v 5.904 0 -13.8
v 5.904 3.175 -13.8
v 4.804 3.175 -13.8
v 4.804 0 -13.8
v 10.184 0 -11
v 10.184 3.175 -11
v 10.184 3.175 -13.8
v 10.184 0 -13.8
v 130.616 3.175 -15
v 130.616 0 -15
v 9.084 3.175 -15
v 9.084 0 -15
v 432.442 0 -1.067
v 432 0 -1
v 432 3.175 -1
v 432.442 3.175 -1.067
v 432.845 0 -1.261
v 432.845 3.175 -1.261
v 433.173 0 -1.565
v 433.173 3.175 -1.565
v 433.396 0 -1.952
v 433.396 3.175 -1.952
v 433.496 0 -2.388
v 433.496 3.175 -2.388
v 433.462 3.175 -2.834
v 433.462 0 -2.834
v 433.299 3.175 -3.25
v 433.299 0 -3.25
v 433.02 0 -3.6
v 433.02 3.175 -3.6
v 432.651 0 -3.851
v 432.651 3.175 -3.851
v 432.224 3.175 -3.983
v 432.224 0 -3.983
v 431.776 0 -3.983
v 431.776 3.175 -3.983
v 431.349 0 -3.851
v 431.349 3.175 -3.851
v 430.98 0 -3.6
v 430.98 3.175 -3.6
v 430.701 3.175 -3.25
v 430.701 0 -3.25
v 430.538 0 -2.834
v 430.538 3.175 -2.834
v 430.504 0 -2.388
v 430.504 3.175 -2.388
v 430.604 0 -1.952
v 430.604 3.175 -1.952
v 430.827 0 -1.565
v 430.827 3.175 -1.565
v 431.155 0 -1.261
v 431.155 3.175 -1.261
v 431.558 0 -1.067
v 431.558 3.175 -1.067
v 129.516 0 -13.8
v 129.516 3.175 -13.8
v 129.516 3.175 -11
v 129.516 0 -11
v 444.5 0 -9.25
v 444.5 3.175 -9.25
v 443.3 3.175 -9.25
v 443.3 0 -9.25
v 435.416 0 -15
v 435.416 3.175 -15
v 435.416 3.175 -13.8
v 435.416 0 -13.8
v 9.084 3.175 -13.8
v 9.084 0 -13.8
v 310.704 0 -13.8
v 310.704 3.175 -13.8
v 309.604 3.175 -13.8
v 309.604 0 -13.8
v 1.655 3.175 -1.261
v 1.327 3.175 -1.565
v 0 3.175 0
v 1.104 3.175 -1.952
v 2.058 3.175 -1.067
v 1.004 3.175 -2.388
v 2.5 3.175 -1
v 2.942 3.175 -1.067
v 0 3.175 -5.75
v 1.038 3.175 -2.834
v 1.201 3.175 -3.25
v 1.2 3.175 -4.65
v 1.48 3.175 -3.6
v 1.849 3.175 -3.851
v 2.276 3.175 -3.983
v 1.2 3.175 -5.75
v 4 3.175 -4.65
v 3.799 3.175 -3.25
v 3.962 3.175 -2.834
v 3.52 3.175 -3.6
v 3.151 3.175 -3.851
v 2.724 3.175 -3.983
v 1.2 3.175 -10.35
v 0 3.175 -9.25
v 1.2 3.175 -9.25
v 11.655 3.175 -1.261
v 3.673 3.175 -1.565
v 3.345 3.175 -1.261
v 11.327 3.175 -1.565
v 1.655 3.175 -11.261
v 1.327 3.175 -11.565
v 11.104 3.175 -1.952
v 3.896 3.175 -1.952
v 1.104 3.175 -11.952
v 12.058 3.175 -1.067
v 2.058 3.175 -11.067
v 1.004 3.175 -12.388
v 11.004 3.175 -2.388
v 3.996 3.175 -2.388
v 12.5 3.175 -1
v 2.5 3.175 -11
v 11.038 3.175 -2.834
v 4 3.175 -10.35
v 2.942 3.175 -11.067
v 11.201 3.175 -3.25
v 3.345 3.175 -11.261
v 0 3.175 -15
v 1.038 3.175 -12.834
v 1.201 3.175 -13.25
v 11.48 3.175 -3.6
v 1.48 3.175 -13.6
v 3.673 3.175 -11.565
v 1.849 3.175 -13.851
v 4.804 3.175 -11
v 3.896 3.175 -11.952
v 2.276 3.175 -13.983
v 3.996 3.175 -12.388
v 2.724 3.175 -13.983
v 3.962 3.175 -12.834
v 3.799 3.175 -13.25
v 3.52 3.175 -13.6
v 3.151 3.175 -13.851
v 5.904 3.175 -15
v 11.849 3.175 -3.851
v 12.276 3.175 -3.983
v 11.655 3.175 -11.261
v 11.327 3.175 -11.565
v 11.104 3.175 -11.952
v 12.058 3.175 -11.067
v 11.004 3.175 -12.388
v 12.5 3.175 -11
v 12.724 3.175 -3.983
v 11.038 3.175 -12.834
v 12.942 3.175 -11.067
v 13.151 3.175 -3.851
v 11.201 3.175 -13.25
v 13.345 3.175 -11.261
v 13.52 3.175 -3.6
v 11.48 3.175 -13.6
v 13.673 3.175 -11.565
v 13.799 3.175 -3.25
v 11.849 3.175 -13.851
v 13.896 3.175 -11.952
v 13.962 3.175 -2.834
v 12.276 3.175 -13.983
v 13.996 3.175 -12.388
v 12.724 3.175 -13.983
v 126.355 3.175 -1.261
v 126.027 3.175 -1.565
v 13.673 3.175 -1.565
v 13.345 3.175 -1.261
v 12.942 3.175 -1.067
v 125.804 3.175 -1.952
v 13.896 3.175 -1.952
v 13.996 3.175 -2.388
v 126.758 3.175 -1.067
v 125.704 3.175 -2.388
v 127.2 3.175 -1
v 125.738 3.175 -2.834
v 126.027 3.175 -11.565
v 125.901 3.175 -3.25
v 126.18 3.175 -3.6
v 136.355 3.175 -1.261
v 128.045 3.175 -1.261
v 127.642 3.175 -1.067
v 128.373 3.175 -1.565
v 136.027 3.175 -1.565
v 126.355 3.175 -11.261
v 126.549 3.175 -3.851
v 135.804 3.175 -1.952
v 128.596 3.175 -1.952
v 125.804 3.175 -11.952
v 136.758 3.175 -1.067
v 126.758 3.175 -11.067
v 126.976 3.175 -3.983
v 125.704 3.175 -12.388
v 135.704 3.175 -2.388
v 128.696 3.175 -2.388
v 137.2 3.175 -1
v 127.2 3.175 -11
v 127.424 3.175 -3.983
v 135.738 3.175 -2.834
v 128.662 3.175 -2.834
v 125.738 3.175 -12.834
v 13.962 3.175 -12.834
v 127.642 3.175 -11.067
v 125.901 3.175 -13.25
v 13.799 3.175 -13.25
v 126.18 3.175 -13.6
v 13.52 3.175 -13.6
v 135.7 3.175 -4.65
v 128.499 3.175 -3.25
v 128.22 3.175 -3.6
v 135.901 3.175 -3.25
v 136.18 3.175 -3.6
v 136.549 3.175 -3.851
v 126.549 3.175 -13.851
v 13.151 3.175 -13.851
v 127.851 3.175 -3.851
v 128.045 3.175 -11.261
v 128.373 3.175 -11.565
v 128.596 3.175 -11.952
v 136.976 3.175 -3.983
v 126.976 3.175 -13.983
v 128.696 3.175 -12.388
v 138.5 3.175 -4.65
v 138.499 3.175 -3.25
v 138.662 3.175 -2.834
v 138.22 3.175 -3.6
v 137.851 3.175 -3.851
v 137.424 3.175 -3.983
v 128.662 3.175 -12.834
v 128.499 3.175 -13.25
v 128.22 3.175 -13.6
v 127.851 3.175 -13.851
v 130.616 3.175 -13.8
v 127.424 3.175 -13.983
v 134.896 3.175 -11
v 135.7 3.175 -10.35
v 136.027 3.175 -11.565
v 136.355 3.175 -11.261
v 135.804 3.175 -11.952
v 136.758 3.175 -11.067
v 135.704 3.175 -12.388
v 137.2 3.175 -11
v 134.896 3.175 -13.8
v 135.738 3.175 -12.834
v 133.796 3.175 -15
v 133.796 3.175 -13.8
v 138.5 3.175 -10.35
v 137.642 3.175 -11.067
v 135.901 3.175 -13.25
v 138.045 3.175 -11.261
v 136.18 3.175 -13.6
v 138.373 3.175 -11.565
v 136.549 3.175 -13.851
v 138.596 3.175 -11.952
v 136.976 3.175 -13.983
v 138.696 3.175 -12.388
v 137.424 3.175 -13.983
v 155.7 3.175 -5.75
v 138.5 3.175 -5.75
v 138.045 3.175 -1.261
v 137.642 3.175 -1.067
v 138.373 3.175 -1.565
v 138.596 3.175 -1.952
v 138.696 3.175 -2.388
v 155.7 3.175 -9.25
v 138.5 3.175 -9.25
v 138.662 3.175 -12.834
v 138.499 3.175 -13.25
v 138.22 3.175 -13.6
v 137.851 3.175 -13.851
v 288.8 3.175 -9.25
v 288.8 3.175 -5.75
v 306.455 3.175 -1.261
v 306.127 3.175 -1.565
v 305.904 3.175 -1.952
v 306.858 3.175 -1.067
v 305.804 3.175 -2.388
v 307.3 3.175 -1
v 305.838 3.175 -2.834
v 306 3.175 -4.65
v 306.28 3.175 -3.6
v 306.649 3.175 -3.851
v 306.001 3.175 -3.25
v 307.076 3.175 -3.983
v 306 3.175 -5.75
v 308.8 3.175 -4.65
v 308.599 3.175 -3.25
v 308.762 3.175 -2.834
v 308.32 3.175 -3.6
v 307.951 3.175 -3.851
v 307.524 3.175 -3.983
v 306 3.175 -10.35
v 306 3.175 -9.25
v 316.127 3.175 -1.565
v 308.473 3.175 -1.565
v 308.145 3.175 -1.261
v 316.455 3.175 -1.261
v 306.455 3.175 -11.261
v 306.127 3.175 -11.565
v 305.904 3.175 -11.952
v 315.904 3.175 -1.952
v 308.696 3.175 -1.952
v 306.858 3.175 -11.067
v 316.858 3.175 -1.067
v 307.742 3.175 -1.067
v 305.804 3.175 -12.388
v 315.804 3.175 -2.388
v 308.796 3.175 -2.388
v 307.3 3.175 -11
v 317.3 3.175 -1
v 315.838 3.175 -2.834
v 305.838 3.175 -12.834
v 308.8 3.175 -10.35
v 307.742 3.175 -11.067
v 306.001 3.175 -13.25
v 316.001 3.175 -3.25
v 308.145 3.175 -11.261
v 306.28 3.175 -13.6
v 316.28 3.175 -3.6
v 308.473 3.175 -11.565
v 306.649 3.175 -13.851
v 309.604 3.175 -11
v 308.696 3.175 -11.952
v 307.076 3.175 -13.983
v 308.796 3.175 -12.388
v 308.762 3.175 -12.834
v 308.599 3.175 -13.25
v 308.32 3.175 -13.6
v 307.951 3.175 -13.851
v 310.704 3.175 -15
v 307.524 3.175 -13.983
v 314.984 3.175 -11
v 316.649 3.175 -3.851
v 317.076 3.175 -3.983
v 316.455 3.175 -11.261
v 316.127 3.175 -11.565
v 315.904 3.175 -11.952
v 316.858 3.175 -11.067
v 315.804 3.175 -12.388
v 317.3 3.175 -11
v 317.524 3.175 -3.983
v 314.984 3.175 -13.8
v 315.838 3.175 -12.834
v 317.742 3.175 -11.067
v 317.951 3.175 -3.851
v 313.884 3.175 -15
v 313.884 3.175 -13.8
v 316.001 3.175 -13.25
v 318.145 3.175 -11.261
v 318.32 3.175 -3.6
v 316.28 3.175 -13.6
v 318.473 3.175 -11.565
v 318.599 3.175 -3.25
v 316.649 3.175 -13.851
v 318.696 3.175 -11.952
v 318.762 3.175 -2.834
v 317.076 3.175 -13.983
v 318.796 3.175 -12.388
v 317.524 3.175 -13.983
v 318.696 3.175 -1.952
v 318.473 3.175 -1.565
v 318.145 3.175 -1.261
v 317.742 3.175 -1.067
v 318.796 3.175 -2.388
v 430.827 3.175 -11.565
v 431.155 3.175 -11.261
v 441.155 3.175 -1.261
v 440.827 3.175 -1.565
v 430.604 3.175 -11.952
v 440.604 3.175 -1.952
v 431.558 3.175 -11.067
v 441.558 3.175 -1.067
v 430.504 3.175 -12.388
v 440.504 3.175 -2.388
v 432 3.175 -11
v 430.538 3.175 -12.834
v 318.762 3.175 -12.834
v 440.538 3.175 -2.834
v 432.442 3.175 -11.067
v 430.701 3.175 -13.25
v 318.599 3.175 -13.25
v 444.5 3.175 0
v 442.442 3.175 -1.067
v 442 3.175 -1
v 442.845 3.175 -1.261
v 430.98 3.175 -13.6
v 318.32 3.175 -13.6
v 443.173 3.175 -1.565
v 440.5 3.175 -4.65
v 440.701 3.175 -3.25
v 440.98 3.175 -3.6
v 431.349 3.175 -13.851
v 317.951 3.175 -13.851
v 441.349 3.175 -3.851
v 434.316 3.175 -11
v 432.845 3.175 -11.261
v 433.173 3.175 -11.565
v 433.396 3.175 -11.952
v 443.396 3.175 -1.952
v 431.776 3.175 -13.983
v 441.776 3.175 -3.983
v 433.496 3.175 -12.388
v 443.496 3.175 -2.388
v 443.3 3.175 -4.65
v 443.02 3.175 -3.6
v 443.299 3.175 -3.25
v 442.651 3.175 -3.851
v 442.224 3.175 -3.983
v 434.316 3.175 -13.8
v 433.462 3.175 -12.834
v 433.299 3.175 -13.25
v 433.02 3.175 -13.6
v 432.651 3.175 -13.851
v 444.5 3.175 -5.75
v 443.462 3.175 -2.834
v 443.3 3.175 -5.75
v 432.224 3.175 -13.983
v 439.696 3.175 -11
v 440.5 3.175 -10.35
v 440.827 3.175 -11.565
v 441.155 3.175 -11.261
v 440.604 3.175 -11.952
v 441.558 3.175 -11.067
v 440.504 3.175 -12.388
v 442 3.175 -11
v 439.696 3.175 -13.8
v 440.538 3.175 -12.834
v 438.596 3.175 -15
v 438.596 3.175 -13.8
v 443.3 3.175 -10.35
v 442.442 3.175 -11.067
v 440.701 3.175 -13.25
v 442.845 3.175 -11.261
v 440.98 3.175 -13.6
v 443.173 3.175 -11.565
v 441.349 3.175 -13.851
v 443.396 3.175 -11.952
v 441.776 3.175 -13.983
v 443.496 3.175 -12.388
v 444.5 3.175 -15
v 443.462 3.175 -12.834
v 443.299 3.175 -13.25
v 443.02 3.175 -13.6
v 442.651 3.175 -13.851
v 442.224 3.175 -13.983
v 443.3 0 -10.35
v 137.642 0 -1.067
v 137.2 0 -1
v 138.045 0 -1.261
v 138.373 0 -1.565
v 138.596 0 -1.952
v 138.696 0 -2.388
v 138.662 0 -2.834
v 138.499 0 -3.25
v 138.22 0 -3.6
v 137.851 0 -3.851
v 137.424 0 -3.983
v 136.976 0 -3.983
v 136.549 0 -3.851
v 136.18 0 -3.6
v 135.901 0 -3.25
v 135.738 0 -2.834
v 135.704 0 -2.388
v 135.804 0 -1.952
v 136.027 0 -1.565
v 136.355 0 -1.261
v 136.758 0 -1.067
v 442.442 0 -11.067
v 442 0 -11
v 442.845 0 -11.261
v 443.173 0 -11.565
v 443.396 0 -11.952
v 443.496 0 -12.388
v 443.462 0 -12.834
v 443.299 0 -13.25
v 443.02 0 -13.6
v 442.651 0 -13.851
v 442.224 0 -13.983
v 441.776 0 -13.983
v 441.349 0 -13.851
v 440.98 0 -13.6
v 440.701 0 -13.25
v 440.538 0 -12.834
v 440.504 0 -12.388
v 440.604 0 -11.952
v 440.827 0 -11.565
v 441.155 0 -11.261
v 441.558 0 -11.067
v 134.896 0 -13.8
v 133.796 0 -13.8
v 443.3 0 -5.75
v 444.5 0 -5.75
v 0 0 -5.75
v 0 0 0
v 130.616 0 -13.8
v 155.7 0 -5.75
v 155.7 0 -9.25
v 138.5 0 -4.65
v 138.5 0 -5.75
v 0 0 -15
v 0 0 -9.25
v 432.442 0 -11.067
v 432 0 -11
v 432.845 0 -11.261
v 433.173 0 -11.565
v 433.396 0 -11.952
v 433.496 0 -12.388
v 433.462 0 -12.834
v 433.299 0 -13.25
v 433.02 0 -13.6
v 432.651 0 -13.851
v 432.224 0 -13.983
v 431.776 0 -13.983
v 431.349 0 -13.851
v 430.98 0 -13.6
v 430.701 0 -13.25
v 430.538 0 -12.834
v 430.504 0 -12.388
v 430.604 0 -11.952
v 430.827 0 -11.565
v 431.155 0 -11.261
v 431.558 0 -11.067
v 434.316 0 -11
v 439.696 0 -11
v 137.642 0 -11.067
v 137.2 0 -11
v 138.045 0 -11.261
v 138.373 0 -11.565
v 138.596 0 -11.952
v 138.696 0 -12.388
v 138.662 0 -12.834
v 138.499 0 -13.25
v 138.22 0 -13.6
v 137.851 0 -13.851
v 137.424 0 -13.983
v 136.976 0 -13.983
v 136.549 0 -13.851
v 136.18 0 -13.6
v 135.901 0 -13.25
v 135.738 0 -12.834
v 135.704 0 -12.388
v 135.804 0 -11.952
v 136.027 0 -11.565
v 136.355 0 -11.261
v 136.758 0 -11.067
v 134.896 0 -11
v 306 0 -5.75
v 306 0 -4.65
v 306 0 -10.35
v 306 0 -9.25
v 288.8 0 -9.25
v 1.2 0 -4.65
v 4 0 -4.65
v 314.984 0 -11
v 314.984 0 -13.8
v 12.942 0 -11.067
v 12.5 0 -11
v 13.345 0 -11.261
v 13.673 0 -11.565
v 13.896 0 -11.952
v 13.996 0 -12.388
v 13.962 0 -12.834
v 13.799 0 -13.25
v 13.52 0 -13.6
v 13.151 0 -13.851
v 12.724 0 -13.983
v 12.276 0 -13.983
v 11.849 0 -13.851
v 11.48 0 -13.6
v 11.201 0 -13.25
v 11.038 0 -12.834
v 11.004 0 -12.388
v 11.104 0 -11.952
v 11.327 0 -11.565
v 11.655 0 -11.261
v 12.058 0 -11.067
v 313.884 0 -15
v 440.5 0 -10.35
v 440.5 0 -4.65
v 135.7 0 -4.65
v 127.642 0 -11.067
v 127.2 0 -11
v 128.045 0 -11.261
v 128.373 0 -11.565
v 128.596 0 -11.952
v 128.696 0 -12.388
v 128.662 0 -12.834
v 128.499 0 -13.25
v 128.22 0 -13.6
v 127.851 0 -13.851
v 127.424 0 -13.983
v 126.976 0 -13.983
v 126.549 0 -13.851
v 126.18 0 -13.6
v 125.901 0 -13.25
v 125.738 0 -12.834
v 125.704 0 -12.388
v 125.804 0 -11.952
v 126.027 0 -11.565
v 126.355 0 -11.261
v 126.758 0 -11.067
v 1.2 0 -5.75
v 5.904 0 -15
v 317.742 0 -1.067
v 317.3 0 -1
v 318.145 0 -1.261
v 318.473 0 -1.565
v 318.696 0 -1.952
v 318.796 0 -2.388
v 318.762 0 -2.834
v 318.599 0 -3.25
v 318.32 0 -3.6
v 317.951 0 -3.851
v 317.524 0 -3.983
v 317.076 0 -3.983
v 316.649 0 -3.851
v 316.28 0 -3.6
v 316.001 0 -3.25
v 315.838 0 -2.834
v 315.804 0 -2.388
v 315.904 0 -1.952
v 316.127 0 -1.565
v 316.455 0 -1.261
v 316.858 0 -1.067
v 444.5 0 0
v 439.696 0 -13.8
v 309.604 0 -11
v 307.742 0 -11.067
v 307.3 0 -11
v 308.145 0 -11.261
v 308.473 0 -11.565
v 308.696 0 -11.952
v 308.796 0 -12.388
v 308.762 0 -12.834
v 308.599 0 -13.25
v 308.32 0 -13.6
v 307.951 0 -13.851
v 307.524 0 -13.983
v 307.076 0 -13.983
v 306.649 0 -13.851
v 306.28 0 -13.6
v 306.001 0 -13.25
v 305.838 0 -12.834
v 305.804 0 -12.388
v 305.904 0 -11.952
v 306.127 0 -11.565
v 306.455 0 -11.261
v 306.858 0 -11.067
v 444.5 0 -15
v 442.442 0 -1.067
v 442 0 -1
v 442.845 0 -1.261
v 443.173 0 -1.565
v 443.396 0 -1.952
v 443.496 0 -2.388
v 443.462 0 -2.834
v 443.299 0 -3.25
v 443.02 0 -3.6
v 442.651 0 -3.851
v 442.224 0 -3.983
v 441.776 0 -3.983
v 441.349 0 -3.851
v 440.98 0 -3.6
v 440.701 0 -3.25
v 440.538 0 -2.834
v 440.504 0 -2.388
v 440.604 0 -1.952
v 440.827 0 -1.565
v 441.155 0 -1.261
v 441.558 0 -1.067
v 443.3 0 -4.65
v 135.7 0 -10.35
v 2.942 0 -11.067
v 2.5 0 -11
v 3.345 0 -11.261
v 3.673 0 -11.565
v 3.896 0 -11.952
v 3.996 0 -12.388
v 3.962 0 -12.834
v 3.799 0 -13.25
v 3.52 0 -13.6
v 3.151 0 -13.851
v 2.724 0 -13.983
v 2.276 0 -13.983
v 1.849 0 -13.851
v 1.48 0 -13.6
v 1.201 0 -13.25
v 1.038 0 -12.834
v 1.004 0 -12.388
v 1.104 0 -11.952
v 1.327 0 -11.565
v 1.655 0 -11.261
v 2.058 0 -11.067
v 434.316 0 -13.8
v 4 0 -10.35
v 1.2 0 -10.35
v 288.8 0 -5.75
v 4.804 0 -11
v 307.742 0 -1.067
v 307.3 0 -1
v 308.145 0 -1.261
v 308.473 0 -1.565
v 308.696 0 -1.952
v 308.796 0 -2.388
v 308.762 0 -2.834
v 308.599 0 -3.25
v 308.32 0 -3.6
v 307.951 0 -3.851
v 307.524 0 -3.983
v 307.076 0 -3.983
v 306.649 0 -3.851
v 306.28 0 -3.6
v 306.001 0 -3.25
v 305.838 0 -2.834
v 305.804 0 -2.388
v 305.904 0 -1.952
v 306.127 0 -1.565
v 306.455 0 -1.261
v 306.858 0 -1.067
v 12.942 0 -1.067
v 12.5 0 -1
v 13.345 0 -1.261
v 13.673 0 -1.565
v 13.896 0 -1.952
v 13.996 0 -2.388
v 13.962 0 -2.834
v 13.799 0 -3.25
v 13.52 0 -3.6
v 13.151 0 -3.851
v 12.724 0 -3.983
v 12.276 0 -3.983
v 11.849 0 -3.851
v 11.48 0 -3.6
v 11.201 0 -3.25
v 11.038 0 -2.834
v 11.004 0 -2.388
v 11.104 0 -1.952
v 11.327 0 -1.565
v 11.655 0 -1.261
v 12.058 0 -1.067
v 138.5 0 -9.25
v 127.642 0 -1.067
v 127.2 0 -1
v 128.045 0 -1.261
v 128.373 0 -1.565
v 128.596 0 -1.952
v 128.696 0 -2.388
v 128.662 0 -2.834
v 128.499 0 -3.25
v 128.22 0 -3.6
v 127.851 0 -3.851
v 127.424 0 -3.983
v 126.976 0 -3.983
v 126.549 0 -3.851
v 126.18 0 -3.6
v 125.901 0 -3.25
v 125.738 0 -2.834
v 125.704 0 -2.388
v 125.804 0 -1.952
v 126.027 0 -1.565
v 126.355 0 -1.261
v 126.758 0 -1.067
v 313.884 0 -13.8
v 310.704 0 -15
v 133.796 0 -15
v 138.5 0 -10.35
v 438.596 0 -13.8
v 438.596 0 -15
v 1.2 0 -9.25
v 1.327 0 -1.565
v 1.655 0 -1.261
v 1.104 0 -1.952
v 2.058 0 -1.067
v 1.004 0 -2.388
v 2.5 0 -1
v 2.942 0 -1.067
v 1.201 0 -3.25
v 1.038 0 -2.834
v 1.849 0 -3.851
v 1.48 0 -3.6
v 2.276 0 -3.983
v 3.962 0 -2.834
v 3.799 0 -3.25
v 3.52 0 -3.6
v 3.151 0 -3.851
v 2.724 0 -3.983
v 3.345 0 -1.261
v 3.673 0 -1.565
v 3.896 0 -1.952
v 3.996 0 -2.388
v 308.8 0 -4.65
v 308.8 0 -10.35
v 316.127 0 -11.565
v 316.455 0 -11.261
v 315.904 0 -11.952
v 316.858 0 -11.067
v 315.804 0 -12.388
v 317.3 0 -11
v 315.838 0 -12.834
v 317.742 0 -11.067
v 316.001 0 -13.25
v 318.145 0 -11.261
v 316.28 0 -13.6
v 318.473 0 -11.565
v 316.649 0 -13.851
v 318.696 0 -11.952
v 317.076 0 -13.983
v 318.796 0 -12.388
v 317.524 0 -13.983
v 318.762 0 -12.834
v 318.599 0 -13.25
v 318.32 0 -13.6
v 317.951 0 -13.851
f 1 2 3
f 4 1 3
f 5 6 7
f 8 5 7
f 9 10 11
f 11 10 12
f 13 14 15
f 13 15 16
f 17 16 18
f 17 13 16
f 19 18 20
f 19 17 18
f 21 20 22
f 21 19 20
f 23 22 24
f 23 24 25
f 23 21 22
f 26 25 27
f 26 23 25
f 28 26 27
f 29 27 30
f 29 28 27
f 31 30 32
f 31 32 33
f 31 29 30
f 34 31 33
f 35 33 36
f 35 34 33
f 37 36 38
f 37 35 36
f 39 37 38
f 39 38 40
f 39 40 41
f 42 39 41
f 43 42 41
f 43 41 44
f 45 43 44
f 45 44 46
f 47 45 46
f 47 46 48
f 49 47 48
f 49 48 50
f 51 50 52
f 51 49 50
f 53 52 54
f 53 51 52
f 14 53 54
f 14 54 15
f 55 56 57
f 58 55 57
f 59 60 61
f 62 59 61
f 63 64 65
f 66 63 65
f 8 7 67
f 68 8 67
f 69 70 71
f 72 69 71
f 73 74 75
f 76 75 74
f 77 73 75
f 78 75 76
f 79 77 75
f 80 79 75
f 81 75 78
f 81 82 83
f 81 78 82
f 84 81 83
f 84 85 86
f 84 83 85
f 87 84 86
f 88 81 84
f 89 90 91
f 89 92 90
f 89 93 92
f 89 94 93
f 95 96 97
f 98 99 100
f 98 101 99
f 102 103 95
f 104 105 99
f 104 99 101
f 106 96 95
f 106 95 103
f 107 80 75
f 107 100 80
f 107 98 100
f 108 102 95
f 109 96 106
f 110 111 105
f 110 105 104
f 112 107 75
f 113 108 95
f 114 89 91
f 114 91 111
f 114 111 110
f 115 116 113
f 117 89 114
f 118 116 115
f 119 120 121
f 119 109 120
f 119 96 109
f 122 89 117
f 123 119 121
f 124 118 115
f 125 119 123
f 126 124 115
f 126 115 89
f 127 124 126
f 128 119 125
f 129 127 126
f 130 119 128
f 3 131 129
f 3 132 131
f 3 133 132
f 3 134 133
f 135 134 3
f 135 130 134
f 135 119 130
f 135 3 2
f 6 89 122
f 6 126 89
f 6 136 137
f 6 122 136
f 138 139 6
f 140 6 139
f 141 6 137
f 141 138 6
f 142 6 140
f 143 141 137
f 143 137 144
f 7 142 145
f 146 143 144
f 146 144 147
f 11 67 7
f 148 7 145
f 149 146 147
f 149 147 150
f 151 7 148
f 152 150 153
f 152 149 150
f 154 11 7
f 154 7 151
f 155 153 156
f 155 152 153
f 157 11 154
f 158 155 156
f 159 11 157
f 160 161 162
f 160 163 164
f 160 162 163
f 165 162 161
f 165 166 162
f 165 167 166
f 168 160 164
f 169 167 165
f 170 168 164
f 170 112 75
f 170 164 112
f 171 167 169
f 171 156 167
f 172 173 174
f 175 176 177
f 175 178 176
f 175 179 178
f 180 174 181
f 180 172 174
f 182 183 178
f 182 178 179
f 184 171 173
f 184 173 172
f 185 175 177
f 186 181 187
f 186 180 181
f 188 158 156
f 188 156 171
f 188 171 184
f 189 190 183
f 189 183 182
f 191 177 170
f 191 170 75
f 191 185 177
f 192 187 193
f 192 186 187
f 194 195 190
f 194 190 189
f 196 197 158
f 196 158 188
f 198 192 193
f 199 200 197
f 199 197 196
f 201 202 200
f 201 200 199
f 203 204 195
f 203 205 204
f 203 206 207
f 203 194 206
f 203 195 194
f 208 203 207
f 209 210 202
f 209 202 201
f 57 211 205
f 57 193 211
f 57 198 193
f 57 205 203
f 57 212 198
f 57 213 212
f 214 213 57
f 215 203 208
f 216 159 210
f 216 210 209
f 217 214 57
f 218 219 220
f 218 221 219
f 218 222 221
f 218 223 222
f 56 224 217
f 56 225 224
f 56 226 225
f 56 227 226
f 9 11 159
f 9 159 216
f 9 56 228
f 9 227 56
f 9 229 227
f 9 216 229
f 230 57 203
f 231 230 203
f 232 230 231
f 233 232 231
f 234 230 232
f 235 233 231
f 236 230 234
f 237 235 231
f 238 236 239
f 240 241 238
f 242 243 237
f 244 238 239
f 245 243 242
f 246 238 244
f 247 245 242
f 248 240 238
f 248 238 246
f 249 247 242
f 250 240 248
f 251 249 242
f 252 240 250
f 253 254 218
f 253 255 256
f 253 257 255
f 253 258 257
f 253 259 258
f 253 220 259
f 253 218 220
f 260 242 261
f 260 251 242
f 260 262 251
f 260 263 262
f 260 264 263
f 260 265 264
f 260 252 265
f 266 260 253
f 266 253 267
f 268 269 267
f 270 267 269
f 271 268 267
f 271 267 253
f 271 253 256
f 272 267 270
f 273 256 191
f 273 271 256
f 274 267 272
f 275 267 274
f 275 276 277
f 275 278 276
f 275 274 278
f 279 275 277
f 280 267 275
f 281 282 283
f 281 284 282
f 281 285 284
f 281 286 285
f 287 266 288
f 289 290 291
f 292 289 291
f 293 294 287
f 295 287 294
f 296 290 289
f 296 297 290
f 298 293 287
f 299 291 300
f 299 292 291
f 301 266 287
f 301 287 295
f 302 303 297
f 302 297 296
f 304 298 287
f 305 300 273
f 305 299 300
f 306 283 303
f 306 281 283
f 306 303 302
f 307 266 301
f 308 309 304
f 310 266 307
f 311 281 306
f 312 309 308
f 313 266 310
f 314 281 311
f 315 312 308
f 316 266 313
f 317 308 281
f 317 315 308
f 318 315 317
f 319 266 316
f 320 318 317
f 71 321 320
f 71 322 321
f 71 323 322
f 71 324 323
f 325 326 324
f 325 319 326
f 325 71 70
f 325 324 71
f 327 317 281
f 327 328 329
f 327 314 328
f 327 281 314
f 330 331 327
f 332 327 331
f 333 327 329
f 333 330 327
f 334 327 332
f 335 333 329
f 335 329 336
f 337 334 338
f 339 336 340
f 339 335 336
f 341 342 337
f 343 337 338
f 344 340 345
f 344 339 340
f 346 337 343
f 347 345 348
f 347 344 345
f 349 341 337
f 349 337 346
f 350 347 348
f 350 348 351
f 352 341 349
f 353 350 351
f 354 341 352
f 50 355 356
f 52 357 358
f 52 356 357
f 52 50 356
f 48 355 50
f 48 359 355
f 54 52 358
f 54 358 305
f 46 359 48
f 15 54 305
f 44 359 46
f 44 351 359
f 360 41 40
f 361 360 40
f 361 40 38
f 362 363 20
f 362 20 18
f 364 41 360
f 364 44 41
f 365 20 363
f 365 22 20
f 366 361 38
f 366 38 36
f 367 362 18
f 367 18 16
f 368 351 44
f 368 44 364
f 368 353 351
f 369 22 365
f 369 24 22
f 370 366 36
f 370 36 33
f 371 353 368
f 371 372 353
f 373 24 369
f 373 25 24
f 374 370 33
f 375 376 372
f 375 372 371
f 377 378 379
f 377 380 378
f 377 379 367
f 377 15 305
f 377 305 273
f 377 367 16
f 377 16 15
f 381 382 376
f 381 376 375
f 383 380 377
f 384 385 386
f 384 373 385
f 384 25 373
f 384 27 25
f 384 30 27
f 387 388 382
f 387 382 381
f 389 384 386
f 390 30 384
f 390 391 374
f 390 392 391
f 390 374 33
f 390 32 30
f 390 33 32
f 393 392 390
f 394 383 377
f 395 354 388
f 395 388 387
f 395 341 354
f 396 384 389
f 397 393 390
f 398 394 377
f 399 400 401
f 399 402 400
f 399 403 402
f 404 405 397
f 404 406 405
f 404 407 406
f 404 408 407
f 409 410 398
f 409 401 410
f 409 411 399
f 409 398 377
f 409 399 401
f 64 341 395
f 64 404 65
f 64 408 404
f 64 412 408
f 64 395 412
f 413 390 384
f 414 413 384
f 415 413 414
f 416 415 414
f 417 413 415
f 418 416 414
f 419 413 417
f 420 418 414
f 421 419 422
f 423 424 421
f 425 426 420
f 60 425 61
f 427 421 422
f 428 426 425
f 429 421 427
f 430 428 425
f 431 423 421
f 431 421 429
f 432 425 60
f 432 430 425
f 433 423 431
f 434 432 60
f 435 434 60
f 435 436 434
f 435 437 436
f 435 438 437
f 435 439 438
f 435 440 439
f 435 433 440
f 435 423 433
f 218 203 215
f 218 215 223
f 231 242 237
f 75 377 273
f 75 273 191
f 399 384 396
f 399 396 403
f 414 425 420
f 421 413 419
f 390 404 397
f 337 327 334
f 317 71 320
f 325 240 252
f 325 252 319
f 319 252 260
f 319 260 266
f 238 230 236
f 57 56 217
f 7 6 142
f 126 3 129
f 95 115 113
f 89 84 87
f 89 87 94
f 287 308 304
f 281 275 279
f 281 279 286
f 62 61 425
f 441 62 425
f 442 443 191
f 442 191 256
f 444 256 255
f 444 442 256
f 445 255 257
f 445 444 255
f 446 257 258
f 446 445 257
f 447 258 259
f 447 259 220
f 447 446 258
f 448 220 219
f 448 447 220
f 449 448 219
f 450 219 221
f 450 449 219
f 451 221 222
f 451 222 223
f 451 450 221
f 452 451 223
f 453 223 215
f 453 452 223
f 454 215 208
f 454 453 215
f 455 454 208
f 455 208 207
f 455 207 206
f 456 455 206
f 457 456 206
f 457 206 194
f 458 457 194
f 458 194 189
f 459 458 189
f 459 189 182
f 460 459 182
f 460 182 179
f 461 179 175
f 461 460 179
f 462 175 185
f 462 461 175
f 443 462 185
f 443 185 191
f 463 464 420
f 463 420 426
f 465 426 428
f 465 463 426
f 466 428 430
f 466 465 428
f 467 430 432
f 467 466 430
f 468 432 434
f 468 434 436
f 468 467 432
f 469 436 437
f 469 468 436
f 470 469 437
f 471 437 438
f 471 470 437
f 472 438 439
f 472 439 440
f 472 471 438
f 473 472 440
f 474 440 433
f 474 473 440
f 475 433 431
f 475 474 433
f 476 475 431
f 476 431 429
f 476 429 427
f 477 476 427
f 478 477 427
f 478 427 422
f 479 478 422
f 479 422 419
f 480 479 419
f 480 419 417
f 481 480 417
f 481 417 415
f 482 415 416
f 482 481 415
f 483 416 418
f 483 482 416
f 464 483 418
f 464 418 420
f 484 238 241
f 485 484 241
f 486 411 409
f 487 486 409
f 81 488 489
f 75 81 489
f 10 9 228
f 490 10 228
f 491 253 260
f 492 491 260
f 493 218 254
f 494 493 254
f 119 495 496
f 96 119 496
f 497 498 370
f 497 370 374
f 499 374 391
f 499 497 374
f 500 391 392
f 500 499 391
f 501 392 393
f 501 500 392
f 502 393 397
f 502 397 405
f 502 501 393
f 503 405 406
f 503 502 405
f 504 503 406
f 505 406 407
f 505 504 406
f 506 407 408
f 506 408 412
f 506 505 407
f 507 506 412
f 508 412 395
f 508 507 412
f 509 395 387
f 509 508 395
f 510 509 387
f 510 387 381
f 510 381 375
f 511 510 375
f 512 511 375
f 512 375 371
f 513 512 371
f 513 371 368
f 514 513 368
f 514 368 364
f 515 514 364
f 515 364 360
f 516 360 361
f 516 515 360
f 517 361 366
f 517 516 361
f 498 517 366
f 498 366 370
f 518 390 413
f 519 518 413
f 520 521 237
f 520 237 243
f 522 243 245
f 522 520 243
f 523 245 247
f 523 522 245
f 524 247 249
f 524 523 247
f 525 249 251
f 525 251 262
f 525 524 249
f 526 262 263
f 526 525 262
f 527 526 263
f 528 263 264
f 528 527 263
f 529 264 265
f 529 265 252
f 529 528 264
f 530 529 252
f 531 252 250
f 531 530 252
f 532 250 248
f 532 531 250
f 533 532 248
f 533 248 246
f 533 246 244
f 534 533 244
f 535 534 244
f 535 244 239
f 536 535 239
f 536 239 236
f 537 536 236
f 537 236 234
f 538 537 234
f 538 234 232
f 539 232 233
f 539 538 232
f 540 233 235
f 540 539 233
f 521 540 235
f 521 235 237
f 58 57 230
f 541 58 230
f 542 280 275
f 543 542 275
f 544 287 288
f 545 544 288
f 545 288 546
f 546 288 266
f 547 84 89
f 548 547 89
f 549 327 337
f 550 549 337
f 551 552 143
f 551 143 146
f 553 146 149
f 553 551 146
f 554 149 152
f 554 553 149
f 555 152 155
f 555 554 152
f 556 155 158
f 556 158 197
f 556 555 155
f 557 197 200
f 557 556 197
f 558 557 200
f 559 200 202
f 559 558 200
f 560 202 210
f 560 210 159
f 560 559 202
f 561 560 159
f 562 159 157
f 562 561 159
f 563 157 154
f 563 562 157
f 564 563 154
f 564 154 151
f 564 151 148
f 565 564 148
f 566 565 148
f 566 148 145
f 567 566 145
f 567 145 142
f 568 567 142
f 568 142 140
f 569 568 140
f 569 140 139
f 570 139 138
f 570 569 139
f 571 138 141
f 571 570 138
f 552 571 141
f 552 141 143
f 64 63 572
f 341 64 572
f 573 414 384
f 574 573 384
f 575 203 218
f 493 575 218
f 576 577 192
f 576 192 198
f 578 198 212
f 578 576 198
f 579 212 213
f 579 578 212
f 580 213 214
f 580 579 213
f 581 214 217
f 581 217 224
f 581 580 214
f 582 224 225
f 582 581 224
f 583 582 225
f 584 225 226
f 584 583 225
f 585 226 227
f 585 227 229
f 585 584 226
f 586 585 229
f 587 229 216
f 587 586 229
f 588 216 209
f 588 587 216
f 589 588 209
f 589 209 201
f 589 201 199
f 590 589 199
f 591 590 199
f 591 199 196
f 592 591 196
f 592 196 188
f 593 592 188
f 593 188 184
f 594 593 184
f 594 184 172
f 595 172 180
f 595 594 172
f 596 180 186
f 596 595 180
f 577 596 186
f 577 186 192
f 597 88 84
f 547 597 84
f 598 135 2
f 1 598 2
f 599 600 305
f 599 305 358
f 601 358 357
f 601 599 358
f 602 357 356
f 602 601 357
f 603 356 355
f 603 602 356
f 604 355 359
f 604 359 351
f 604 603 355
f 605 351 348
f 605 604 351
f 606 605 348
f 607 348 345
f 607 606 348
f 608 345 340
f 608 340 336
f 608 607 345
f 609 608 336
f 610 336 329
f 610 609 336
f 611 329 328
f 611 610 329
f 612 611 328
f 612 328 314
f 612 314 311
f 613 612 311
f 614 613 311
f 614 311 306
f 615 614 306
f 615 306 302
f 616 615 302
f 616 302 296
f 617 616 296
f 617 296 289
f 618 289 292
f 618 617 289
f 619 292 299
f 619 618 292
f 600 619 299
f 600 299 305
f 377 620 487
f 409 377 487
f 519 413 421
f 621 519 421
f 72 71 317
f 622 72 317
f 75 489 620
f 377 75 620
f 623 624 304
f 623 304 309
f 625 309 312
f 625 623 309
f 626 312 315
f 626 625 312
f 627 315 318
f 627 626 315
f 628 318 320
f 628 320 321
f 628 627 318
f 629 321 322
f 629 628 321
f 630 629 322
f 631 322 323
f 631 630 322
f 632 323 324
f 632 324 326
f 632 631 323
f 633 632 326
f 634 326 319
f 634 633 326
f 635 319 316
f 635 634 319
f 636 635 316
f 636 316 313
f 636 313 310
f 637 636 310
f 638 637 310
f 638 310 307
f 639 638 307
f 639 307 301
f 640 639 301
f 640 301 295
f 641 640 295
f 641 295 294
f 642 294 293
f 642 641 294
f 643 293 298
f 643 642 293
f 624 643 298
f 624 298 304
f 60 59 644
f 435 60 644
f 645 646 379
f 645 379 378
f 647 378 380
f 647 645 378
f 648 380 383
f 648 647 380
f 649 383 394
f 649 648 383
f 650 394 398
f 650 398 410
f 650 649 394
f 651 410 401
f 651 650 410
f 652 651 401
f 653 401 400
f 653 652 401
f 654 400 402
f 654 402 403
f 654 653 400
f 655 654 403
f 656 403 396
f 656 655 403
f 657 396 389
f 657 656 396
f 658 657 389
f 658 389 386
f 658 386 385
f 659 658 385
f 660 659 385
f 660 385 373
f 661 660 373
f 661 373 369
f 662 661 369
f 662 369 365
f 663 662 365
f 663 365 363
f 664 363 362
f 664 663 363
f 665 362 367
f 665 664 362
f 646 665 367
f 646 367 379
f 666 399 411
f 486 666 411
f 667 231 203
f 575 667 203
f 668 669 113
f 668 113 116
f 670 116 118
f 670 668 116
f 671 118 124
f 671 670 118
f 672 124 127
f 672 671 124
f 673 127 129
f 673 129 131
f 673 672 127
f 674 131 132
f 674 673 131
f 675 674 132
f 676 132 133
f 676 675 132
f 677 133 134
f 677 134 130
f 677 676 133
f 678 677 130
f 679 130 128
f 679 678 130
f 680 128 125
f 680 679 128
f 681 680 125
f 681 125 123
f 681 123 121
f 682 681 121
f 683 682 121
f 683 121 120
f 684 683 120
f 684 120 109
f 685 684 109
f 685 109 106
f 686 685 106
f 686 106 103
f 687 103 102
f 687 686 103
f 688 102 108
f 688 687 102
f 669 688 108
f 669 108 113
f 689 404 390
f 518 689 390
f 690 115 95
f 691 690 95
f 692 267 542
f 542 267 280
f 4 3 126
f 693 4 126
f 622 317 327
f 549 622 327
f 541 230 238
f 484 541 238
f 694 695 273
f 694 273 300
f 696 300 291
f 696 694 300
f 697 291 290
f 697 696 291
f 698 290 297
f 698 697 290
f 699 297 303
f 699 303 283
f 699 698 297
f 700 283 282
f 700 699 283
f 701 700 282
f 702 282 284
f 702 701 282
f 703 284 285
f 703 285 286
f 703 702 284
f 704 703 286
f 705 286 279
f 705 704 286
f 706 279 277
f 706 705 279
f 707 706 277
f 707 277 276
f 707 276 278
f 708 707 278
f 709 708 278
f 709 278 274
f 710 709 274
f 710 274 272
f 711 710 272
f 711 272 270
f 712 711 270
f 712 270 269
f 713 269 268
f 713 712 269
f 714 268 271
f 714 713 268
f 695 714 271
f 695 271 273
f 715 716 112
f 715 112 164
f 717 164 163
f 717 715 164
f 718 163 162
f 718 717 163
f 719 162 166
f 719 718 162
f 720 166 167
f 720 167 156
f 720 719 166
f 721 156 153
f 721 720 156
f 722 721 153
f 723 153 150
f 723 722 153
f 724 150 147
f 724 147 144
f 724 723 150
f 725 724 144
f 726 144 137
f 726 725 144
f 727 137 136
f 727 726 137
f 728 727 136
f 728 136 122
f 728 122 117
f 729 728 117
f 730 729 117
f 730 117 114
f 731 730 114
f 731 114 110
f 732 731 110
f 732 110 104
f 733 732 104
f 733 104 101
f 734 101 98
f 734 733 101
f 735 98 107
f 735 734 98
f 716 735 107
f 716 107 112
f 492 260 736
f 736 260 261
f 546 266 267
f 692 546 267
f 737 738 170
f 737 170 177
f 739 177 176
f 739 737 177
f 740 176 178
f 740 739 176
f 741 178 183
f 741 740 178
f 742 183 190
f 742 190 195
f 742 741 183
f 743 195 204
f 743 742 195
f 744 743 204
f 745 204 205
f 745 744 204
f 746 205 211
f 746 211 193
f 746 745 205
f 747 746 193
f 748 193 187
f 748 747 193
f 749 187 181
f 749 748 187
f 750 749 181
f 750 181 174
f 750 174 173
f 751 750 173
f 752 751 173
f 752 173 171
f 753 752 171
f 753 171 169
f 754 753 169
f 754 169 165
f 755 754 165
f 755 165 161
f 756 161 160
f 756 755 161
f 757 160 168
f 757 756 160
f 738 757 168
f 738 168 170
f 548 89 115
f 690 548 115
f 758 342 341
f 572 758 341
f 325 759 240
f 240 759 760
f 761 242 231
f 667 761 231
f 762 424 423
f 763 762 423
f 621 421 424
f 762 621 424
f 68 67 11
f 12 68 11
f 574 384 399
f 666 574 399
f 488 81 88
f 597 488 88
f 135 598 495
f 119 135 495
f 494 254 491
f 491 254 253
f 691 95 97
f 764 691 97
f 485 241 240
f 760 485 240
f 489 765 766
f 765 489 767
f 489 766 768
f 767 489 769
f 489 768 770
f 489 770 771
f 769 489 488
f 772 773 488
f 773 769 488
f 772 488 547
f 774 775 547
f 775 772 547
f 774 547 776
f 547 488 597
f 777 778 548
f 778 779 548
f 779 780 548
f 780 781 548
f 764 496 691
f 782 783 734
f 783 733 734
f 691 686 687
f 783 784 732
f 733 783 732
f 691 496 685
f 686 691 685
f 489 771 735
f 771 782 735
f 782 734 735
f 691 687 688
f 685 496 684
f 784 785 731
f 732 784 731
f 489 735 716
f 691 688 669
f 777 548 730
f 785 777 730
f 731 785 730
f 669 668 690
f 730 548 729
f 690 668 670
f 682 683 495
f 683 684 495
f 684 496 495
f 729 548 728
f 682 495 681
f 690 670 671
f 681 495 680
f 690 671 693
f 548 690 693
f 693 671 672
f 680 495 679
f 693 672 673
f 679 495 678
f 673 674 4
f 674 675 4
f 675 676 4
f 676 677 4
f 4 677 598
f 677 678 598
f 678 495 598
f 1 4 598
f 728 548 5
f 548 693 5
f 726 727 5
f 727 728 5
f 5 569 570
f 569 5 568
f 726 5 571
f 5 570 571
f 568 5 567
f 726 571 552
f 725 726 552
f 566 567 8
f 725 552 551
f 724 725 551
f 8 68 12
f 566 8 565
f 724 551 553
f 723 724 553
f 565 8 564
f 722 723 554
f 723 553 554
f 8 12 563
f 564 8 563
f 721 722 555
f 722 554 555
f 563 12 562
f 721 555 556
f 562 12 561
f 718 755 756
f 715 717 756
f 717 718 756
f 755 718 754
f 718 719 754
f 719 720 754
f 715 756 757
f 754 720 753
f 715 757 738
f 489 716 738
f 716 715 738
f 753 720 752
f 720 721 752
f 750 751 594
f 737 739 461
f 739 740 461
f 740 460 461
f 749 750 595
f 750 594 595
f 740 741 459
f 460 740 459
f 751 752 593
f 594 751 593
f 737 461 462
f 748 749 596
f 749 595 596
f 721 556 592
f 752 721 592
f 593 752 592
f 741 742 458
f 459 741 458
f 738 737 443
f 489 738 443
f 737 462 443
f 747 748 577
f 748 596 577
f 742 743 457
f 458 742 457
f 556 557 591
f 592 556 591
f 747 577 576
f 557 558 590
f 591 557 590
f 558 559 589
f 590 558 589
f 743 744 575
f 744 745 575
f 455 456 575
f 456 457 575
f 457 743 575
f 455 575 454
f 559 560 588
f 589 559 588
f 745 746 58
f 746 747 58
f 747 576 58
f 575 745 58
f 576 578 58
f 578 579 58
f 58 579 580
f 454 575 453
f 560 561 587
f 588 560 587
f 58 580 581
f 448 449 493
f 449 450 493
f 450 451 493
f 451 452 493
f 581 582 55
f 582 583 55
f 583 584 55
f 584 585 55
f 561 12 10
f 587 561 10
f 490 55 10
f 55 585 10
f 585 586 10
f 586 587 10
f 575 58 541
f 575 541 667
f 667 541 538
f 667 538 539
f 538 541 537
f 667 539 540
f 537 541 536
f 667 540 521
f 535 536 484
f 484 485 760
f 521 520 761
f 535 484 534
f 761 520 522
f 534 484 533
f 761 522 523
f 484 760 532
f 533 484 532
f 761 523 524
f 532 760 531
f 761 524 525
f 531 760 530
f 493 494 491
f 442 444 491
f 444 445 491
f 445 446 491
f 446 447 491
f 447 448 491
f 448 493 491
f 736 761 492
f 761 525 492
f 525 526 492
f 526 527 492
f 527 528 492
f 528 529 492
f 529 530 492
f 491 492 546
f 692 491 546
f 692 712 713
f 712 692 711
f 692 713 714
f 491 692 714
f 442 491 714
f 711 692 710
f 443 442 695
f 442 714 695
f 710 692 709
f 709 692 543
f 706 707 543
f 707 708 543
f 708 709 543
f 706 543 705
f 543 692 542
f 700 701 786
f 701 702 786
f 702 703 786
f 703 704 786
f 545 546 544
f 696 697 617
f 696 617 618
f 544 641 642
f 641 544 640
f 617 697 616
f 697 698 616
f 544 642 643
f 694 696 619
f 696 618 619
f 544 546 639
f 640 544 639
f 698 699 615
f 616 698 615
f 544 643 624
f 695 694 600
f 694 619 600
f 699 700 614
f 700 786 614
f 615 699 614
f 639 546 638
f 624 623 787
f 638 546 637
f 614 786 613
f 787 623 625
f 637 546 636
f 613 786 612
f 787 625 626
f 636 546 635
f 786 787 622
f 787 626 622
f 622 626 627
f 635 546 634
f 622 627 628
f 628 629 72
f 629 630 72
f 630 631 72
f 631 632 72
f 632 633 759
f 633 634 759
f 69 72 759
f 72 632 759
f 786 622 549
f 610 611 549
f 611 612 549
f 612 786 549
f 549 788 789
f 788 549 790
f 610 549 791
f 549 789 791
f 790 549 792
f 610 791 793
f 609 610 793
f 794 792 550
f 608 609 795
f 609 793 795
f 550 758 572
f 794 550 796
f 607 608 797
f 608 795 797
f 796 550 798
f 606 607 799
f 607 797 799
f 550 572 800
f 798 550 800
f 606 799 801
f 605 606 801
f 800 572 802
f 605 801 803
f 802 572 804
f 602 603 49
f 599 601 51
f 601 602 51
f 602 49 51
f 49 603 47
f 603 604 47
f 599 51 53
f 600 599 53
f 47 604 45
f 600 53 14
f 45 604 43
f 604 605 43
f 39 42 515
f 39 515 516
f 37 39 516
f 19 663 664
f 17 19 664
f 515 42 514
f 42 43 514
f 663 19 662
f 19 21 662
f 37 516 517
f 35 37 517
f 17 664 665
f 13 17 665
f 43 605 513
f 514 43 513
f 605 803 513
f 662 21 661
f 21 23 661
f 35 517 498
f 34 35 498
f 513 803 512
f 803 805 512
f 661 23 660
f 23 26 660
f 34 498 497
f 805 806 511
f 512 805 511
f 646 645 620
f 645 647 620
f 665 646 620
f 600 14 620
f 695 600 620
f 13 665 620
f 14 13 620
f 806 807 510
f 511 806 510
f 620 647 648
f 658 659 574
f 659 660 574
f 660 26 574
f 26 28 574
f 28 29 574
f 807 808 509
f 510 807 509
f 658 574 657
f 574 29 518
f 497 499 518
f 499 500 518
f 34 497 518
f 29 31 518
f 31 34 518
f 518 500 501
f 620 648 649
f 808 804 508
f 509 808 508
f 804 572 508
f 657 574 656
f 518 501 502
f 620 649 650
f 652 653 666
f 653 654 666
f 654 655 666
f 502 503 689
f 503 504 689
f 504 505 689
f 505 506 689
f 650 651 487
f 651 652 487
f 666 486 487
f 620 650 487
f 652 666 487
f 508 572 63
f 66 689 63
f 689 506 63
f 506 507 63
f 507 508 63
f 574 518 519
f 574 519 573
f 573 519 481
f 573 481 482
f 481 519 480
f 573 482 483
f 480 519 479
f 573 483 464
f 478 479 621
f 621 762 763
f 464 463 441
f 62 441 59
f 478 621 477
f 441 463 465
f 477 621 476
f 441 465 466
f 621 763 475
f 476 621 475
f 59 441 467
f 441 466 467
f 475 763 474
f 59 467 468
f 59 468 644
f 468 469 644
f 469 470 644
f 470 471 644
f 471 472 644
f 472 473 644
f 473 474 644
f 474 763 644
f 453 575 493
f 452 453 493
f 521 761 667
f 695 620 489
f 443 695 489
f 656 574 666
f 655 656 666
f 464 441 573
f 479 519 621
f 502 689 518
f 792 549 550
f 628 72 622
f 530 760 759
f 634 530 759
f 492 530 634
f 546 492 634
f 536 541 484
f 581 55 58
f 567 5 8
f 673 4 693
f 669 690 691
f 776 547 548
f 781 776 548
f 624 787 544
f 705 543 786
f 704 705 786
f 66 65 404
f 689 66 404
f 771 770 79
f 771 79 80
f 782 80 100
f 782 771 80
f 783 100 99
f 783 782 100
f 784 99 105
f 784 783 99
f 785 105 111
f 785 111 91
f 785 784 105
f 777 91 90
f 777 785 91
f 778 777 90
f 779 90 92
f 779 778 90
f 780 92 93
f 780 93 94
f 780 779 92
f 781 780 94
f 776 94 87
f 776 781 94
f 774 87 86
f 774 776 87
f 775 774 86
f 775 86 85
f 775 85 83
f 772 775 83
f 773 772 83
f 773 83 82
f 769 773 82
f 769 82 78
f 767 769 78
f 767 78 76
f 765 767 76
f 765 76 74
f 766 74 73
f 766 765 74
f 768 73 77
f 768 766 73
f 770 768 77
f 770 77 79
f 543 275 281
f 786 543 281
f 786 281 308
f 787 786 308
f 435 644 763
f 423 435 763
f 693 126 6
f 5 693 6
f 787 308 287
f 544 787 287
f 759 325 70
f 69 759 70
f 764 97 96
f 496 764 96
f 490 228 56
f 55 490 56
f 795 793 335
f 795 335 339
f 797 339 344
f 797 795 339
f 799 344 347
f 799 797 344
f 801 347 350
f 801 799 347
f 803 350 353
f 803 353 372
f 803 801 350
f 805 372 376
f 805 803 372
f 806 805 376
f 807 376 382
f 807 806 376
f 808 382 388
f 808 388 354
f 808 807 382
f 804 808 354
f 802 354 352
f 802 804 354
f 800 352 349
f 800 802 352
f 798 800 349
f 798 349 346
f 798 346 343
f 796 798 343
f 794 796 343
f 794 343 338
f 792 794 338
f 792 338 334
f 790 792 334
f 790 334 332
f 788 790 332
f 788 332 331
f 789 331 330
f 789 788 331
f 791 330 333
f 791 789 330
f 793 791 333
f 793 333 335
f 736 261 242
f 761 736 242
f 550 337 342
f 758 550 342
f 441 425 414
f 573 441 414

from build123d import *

# Parameters (mm, degrees)
SKETCH1_R           = 1.5
BOSS_EXTRUDE1_DEPTH = 3.175
CUT_EXTRUDE19_DEPTH = 445.76435404


with BuildPart() as part:
    # Sketch1 → Boss-Extrude1 (new body)
    with BuildSketch(Plane(origin=(0, 0, 0), x_dir=(1, 0, 0), z_dir=(0, 1, 0))):
        Polygon((0, 7.5), (0, 0), (444.5, 0), (444.5, 15), (0, 15), align=None)
        with Locations(Location((2.5, 2.5, 0), (0, 0, 270))):
            Circle(SKETCH1_R, mode=Mode.SUBTRACT)
        with Locations(Location((12.5, 2.5, 0), (0, 0, 270))):
            Circle(SKETCH1_R, mode=Mode.SUBTRACT)
        with Locations(Location((127.2, 2.5, 0), (0, 0, 270))):
            Circle(SKETCH1_R, mode=Mode.SUBTRACT)
        with Locations(Location((137.2, 2.5, 0), (0, 0, 270))):
            Circle(SKETCH1_R, mode=Mode.SUBTRACT)
        with Locations(Location((2.5, 12.5, 0), (0, 0, 270))):
            Circle(SKETCH1_R, mode=Mode.SUBTRACT)
        with Locations(Location((12.5, 12.5, 0), (0, 0, 270))):
            Circle(SKETCH1_R, mode=Mode.SUBTRACT)
        with Locations(Location((127.2, 12.5, 0), (0, 0, 270))):
            Circle(SKETCH1_R, mode=Mode.SUBTRACT)
        with Locations(Location((137.2, 12.5, 0), (0, 0, 270))):
            Circle(SKETCH1_R, mode=Mode.SUBTRACT)
        with Locations(Location((442, 12.5, 0), (0, 0, 270))):
            Circle(SKETCH1_R, mode=Mode.SUBTRACT)
        with Locations(Location((307.3, 2.5, 0), (0, 0, 270))):
            Circle(SKETCH1_R, mode=Mode.SUBTRACT)
        with Locations(Location((317.3, 2.5, 0), (0, 0, 270))):
            Circle(SKETCH1_R, mode=Mode.SUBTRACT)
        with Locations(Location((432, 2.5, 0), (0, 0, 270))):
            Circle(SKETCH1_R, mode=Mode.SUBTRACT)
        with Locations(Location((442, 2.5, 0), (0, 0, 270))):
            Circle(SKETCH1_R, mode=Mode.SUBTRACT)
        with Locations(Location((307.3, 12.5, 0), (0, 0, 270))):
            Circle(SKETCH1_R, mode=Mode.SUBTRACT)
        with Locations(Location((317.3, 12.5, 0), (0, 0, 270))):
            Circle(SKETCH1_R, mode=Mode.SUBTRACT)
        with Locations(Location((432, 12.5, 0), (0, 0, 270))):
            Circle(SKETCH1_R, mode=Mode.SUBTRACT)
    extrude(amount=BOSS_EXTRUDE1_DEPTH)

    # Sketch23 → Cut-Extrude19 (cut, through all)
    with BuildSketch(Plane(origin=(0, 3.175, 0), x_dir=(1, 0, 0), z_dir=(0, 1, 0))):
        Polygon((444.5, 7.5), (444.5, 9.25), (443.3, 9.25), (443.3, 10.35), (440.5, 10.35), (440.5, 4.65), (443.3, 4.65), (443.3, 5.75), (444.5, 5.75), align=None)
        Polygon((437, 15), (435.416405275, 15), (435.416405275, 13.8), (434.316405275, 13.8), (434.316405275, 11), (439.695743789, 11), (439.695743789, 13.8), (438.595743789, 13.8), (438.595743789, 15), align=None)
        Polygon((306, 5.75), (306, 4.65), (308.8, 4.65), (308.8, 10.35), (306, 10.35), (306, 9.25), (304.8, 9.25), (288.8, 9.25), (288.8, 5.75), (304.8, 5.75), align=None)
        Polygon((312.3, 15), (310.704256211, 15), (310.704256211, 13.8), (309.604256211, 13.8), (309.604256211, 11), (314.983594725, 11), (314.983594725, 13.8), (313.883594725, 13.8), (313.883594725, 15), align=None)
        Polygon((135.7, 4.65), (138.5, 4.65), (138.5, 5.75), (139.7, 5.75), (155.7, 5.75), (155.7, 9.25), (139.7, 9.25), (138.5, 9.25), (138.5, 10.35), (135.7, 10.35), align=None)
        Polygon((132.2, 15), (130.616405275, 15), (130.616405275, 13.8), (129.516405275, 13.8), (129.516405275, 11), (134.895743789, 11), (134.895743789, 13.8), (133.795743789, 13.8), (133.795743789, 15), align=None)
        Polygon((7.5, 15), (5.904256211, 15), (5.904256211, 13.8), (4.804256211, 13.8), (4.804256211, 11), (10.183594725, 11), (10.183594725, 13.8), (9.083594725, 13.8), (9.083594725, 15), align=None)
        Polygon((0, 9.25), (0, 7.5), (0, 5.75), (1.2, 5.75), (1.2, 4.65), (4, 4.65), (4, 10.35), (1.2, 10.35), (1.2, 9.25), align=None)
    extrude(amount=-CUT_EXTRUDE19_DEPTH, mode=Mode.SUBTRACT)


solid = part.part
